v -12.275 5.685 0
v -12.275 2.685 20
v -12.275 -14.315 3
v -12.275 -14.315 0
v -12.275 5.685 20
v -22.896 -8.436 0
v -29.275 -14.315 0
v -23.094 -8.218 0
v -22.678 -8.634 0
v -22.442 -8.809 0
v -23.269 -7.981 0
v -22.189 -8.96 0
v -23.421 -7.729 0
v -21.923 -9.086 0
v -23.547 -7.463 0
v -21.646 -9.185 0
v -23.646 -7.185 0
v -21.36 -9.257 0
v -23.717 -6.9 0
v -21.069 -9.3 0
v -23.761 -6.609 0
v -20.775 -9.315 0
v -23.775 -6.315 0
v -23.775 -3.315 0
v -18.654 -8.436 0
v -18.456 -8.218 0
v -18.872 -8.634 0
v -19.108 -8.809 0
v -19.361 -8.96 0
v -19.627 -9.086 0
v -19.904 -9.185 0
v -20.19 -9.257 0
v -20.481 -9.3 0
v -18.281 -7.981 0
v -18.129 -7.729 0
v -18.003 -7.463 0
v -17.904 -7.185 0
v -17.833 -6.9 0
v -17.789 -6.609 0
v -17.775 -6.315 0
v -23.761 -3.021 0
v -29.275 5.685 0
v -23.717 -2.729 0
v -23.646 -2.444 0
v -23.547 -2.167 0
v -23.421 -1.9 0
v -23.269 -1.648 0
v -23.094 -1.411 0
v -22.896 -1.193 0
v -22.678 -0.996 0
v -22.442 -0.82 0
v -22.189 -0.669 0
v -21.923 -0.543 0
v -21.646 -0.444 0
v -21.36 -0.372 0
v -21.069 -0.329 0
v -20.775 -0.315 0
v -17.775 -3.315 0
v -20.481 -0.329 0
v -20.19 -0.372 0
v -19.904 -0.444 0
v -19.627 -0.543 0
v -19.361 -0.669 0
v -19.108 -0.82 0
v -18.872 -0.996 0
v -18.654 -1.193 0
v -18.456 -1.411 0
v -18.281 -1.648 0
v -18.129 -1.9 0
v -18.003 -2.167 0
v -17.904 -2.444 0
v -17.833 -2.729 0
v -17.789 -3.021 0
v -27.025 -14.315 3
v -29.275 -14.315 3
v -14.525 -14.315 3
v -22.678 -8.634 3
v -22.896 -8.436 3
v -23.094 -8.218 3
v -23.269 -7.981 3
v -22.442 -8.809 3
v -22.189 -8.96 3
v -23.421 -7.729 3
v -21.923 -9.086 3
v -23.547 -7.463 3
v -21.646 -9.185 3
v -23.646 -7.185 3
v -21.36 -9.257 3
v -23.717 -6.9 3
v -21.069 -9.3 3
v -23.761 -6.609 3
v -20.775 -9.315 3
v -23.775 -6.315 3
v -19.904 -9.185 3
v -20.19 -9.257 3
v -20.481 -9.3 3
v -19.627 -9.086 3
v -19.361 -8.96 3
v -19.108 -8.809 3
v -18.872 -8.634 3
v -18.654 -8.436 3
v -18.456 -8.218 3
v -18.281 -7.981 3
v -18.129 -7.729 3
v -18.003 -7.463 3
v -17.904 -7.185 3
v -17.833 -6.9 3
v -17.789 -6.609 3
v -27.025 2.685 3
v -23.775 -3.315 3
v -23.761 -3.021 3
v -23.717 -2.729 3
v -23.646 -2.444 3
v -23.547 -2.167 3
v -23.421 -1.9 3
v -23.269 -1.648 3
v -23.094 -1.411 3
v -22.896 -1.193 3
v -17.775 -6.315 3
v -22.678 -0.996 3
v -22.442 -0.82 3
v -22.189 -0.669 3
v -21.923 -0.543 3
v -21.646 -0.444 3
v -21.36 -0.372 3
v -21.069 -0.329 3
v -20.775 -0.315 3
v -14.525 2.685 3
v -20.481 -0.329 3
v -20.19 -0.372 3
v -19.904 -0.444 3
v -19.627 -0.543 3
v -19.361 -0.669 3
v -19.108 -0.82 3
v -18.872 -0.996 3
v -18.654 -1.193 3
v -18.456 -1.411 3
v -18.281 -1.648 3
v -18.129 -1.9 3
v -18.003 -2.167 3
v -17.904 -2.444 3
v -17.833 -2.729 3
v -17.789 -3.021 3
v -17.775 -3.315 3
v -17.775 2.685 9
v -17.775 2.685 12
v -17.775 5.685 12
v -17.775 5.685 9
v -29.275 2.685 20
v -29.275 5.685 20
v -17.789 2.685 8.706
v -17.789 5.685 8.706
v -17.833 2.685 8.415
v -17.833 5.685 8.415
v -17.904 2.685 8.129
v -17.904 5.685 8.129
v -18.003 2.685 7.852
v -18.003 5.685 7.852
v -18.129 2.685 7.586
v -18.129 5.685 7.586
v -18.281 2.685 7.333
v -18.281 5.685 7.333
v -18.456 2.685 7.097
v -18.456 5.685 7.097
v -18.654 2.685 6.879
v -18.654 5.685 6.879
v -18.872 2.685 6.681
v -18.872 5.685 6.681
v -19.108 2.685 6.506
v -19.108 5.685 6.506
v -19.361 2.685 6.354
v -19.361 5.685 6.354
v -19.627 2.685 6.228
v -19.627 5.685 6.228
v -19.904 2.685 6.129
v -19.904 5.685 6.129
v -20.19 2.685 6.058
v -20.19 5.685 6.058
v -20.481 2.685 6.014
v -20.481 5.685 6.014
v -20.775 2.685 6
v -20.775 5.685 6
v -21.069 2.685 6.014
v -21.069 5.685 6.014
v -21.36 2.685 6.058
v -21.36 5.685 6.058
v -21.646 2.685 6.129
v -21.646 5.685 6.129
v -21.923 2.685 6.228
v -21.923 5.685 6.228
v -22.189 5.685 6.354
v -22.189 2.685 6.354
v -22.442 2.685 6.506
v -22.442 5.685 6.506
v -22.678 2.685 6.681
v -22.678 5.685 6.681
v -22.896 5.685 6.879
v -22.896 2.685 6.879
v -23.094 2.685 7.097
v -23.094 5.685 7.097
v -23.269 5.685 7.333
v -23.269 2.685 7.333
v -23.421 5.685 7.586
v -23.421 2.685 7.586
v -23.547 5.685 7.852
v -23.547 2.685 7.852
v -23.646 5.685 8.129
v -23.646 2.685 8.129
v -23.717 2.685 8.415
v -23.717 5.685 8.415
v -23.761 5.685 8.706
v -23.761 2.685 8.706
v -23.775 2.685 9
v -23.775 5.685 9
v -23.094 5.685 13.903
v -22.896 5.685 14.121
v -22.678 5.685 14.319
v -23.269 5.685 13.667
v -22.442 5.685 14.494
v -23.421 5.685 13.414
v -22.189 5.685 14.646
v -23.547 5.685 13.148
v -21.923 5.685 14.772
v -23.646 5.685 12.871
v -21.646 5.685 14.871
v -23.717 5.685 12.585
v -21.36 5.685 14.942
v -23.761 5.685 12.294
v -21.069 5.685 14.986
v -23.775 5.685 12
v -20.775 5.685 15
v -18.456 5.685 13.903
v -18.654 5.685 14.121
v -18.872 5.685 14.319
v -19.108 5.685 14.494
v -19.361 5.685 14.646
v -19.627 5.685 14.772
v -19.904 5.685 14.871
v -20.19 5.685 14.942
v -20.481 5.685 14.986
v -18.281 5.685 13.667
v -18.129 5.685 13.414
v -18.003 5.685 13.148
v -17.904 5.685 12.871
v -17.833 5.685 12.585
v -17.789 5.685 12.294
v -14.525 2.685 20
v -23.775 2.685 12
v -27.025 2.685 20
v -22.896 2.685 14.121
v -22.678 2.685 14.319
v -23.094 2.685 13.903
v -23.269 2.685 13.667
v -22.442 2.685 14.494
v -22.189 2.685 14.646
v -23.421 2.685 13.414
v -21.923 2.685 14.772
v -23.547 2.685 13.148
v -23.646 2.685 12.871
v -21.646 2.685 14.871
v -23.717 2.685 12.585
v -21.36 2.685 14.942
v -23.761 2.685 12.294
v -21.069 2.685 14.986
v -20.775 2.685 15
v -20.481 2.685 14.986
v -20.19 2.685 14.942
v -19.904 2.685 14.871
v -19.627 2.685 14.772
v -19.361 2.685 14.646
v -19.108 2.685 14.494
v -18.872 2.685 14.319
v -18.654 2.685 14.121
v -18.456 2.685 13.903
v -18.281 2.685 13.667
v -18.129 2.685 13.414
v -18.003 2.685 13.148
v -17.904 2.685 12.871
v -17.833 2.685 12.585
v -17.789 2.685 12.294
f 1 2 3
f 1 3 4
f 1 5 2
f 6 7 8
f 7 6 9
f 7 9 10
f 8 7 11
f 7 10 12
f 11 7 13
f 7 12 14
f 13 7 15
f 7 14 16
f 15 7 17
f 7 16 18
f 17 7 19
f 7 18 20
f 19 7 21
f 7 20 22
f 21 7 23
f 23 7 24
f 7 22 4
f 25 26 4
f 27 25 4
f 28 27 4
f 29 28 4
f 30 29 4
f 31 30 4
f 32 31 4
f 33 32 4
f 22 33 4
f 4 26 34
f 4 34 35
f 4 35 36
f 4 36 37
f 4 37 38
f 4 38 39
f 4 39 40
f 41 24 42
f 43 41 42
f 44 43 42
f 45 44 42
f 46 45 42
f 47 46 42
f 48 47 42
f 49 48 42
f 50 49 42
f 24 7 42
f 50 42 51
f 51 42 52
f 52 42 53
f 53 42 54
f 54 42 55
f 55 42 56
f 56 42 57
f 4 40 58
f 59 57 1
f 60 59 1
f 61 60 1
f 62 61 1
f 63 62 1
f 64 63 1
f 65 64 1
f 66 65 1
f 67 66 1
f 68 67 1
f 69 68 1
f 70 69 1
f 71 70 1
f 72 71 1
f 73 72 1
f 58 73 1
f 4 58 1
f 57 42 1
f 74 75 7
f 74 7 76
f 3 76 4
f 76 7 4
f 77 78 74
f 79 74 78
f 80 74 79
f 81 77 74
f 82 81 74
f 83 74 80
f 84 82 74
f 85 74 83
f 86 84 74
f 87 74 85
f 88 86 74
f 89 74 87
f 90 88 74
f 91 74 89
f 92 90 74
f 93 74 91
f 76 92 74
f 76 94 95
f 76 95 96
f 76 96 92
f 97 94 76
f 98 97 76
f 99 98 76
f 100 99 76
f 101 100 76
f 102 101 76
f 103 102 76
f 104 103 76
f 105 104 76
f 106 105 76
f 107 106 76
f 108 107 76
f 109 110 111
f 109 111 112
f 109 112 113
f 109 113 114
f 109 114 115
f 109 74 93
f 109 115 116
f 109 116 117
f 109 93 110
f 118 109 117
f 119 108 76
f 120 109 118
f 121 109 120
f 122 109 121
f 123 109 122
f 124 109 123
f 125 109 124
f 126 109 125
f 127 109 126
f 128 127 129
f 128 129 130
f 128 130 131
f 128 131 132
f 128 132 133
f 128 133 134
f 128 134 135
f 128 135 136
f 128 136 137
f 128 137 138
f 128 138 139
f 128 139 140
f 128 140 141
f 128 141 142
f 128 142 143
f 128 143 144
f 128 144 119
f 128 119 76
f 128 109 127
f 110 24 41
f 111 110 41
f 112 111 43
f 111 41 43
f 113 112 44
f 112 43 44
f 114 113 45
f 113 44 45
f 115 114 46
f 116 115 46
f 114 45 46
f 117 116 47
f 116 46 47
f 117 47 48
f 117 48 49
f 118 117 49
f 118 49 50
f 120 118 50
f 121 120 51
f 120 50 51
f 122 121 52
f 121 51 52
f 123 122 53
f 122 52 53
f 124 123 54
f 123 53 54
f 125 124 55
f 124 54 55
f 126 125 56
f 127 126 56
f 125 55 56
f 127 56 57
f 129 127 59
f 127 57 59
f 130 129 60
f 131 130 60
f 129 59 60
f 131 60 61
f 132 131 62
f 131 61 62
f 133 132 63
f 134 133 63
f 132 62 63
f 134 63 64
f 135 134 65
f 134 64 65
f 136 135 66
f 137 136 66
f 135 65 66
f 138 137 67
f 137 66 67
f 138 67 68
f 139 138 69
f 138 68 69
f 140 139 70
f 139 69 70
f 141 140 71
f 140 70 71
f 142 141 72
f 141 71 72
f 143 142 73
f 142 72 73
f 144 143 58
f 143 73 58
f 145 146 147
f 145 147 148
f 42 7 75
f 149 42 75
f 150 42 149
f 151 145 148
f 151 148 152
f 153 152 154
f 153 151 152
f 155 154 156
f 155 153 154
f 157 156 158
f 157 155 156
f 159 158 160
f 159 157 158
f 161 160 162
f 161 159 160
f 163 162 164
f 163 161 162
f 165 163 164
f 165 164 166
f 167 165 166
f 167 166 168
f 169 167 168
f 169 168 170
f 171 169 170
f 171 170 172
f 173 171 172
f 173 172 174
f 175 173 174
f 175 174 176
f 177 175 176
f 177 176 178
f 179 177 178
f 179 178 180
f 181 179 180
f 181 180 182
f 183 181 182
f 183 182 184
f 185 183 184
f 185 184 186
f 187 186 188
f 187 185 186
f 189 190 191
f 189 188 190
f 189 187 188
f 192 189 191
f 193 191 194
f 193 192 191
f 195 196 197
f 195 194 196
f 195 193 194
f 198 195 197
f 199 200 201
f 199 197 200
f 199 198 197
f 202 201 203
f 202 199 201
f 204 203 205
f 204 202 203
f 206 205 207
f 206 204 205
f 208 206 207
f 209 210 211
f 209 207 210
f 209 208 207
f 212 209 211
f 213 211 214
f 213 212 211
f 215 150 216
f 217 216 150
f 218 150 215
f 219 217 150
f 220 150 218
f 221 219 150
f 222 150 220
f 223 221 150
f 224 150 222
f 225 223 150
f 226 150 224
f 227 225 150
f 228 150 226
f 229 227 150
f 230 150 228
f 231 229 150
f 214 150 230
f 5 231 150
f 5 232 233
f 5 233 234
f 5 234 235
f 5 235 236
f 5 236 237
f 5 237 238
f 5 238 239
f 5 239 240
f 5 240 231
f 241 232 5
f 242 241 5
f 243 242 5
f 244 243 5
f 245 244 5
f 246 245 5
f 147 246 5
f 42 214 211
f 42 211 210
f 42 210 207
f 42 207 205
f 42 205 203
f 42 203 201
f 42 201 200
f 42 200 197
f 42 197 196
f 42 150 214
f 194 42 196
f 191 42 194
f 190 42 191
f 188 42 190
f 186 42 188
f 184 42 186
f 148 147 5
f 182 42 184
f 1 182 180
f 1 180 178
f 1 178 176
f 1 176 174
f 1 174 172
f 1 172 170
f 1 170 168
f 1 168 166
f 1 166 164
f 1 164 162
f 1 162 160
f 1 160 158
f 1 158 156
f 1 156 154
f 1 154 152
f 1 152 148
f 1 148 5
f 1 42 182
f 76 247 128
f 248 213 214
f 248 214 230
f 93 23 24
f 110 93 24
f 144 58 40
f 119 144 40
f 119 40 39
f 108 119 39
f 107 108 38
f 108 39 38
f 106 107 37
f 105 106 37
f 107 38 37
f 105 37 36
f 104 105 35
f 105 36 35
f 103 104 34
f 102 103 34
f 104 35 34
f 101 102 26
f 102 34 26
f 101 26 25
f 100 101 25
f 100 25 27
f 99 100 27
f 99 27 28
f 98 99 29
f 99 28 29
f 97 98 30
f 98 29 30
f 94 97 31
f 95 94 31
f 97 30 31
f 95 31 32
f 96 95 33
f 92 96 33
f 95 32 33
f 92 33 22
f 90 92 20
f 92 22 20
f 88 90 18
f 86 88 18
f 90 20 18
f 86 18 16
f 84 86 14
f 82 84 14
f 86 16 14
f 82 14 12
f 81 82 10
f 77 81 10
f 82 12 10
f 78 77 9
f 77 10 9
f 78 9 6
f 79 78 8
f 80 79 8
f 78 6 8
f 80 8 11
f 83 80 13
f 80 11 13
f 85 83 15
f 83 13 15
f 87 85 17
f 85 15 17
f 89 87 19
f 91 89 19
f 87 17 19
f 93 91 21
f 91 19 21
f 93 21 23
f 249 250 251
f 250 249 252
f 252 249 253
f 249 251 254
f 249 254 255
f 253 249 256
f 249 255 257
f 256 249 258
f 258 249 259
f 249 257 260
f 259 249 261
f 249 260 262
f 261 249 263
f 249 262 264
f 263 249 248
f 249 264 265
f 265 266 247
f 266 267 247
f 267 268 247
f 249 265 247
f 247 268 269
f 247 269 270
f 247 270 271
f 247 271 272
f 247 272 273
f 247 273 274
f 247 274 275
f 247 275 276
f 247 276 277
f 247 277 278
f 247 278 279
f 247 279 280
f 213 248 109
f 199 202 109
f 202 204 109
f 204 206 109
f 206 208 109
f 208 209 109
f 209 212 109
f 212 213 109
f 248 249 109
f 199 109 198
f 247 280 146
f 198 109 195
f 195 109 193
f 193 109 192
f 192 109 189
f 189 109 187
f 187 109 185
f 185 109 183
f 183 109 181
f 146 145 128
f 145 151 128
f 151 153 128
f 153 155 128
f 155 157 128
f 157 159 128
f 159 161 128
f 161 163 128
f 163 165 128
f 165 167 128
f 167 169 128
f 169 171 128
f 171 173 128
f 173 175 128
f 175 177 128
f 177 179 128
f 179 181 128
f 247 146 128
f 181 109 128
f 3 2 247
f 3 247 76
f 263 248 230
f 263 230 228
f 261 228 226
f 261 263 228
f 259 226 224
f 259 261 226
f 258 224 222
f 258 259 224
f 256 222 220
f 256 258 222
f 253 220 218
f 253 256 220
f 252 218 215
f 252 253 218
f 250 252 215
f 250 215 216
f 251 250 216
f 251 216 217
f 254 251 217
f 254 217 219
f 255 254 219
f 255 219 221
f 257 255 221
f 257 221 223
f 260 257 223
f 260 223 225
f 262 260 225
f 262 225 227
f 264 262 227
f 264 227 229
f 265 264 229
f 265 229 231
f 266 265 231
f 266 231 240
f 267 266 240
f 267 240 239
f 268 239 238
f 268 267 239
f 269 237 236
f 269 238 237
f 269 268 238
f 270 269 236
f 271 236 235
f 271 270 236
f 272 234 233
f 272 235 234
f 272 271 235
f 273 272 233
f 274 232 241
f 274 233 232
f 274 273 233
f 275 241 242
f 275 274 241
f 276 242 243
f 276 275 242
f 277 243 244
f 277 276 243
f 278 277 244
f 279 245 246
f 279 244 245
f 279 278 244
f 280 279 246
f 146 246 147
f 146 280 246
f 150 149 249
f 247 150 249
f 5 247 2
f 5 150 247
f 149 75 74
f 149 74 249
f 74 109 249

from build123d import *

# Parameters (mm, degrees)
SKETCH_1_W          = 17
SKETCH_1_H          = 20
EXTRUDE_1_DEPTH     = 3
SKETCH_2_W          = 17
SKETCH_2_H          = 3
EXTRUDE_2_DEPTH     = 17
CUT_EXTRUDE_1_DEPTH = 17
EXTRUDE_3_DEPTH     = 2.25
EXTRUDE_4_DEPTH     = 2.25


with BuildPart() as part:
    # Эскиз1 → Бобышка-Вытянуть1 (new body)
    with BuildSketch(Plane.XY):
        with Locations((-20.775029161, -4.314630229)):
            Rectangle(SKETCH_1_W, SKETCH_1_H)
        with BuildLine():
            Line((-17.775029161, -3.314630229), (-17.775029161, -6.314630229))
            ThreePointArc((-17.775029161, -6.314630229), (-20.775029161, -9.314630229), (-23.775029161, -6.314630229))
            Line((-23.775029161, -6.314630229), (-23.775029161, -3.314630229))
            ThreePointArc((-23.775029161, -3.314630229), (-20.775029161, -0.314630229), (-17.775029161, -3.314630229))
        make_face(mode=Mode.SUBTRACT)
    extrude(amount=EXTRUDE_1_DEPTH)

    # Эскиз2 → Бобышка-Вытянуть2 (add)
    with BuildSketch(Plane.XY.offset(3)):
        with Locations((-20.775029161, 4.185369771)):
            Rectangle(SKETCH_2_W, SKETCH_2_H)
    extrude(amount=EXTRUDE_2_DEPTH)

    # Эскиз3 → Вырез-Вытянуть1 (cut)
    with BuildSketch(Plane.XZ.offset(-2.685369771)):
        with BuildLine():
            Line((-17.775029161, 12), (-17.775029161, 9))
            ThreePointArc((-17.775029161, 9), (-20.775029161, 6), (-23.775029161, 9))
            Line((-23.775029161, 9), (-23.775029161, 12))
            ThreePointArc((-23.775029161, 12), (-20.775029161, 15), (-17.775029161, 12))
        make_face()
    extrude(amount=-CUT_EXTRUDE_1_DEPTH, mode=Mode.SUBTRACT)

    # Эскиз4 → Бобышка-Вытянуть3 (add)
    with BuildSketch(Plane.ZY.offset(29.275029161)):
        Polygon((20, 2.685369771), (3, 2.685369771), (3, -14.314630229), align=None)
    extrude(amount=-EXTRUDE_3_DEPTH)

    # Эскиз5 → Бобышка-Вытянуть4 (add)
    with BuildSketch(Plane(origin=(-12.275029161, 0, 0), x_dir=(0, 0, -1), z_dir=(1, 0, 0))):
        Polygon((-3, -14.314630229), (-3, 2.685369771), (-20, 2.685369771), align=None)
    extrude(amount=-EXTRUDE_4_DEPTH)


solid = part.part
